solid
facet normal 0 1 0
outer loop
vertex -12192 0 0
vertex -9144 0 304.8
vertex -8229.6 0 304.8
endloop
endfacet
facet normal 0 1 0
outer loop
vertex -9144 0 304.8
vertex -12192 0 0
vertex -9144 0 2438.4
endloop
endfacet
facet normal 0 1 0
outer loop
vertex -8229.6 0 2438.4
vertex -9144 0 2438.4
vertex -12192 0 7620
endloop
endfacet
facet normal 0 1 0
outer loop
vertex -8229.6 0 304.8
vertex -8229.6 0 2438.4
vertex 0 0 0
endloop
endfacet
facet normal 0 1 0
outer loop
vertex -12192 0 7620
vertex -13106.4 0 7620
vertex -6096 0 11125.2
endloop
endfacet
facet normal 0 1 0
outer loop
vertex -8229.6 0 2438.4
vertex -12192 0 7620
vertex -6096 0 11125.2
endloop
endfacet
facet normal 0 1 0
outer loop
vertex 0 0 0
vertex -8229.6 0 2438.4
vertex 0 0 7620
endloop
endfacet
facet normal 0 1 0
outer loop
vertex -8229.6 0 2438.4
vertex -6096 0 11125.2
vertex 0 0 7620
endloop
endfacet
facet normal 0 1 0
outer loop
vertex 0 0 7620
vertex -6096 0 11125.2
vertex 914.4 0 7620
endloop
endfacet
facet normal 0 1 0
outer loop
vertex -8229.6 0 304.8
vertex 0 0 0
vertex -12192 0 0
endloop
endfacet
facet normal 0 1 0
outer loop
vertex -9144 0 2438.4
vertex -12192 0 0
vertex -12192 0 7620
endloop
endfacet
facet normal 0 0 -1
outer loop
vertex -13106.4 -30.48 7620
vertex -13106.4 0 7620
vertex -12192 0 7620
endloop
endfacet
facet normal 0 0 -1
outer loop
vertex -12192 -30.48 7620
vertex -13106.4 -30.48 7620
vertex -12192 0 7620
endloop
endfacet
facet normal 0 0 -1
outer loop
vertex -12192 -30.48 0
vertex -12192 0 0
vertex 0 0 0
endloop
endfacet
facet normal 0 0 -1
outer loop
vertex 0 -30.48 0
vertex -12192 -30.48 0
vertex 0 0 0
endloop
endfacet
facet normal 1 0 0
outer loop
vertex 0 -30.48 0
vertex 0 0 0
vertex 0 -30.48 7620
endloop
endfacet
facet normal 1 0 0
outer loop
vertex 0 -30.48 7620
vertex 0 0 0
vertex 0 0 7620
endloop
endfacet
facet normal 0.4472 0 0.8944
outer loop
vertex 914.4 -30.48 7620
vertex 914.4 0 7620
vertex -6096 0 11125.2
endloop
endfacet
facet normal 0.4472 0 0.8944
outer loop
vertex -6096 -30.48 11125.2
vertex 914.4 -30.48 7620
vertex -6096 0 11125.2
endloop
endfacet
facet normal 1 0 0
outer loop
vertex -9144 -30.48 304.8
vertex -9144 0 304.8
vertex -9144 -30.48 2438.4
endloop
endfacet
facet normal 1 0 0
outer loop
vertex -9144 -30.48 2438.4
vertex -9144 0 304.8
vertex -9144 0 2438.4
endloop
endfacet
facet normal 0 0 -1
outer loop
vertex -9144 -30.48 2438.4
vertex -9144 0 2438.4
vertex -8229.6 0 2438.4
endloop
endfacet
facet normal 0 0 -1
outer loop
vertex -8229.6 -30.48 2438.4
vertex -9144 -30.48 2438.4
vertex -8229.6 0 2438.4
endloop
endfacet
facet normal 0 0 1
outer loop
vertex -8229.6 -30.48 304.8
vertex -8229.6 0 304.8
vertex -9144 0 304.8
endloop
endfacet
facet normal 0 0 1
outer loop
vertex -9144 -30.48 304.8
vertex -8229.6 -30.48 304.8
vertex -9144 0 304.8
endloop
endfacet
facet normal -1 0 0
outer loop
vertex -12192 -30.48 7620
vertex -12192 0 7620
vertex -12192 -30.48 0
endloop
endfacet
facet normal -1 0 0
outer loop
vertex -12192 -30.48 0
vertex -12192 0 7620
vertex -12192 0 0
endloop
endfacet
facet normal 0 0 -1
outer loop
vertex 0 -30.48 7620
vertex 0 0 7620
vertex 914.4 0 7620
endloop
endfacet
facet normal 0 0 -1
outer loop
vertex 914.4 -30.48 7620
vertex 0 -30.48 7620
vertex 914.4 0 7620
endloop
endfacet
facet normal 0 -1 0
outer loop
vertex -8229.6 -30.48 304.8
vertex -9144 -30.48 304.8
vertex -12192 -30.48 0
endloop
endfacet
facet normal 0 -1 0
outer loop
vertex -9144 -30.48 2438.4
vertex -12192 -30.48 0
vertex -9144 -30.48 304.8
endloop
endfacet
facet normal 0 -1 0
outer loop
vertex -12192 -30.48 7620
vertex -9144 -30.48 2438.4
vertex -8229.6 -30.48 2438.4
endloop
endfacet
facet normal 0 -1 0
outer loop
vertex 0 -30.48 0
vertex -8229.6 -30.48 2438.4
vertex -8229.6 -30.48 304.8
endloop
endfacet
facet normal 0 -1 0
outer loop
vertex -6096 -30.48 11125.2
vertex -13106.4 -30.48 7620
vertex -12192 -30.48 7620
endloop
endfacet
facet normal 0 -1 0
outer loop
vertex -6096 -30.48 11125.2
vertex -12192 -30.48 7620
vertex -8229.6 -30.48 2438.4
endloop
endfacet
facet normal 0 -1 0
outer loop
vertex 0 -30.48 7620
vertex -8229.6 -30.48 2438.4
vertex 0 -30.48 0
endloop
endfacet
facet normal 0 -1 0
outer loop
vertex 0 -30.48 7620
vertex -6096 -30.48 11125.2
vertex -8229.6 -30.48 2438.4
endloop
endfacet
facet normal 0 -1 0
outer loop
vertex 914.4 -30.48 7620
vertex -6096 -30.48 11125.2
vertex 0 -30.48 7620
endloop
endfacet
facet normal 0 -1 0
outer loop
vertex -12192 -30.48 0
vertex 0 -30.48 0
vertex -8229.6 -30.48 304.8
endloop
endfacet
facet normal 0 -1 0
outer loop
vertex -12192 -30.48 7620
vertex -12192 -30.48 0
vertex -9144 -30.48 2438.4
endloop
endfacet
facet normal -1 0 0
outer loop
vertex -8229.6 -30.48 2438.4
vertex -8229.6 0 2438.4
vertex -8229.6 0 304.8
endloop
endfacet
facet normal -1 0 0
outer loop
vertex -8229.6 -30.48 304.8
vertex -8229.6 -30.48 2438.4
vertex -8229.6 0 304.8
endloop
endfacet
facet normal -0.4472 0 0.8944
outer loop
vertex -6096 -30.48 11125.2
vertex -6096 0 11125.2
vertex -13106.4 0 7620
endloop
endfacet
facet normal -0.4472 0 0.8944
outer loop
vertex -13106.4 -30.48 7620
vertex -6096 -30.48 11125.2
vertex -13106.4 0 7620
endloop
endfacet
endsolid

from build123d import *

# Parameters (mm, degrees)
F1_DEPTH = 30.48


with BuildPart() as f1:
    # F0 (on Front) → F1 (new body)
    with BuildSketch(Plane.XZ):
        Polygon((-12192, 0), (0, 0), (0, 304.8), (-8229.6, 304.8), (-9144, 304.8), (-12192, 304.8), align=None)
        Polygon((-13106.4, 7620), (-12192, 7620), (-6096, 10668), (-6096, 11125.2), align=None)
        Polygon((-6096, 10668), (0, 7620), (914.4, 7620), (-6096, 11125.2), align=None)
        Polygon((-6096, 10668), (-12192, 7620), (-6096, 7620), align=None)
        Polygon((-6096, 7620), (0, 7620), (-6096, 10668), align=None)
        Polygon((-8229.6, 304.8), (0, 304.8), (0, 7620), (-6096, 7620), (-12192, 7620), (-12192, 304.8), (-9144, 304.8), (-9144, 2438.4), (-8229.6, 2438.4), align=None)
    extrude(amount=F1_DEPTH)


solid = f1.part
